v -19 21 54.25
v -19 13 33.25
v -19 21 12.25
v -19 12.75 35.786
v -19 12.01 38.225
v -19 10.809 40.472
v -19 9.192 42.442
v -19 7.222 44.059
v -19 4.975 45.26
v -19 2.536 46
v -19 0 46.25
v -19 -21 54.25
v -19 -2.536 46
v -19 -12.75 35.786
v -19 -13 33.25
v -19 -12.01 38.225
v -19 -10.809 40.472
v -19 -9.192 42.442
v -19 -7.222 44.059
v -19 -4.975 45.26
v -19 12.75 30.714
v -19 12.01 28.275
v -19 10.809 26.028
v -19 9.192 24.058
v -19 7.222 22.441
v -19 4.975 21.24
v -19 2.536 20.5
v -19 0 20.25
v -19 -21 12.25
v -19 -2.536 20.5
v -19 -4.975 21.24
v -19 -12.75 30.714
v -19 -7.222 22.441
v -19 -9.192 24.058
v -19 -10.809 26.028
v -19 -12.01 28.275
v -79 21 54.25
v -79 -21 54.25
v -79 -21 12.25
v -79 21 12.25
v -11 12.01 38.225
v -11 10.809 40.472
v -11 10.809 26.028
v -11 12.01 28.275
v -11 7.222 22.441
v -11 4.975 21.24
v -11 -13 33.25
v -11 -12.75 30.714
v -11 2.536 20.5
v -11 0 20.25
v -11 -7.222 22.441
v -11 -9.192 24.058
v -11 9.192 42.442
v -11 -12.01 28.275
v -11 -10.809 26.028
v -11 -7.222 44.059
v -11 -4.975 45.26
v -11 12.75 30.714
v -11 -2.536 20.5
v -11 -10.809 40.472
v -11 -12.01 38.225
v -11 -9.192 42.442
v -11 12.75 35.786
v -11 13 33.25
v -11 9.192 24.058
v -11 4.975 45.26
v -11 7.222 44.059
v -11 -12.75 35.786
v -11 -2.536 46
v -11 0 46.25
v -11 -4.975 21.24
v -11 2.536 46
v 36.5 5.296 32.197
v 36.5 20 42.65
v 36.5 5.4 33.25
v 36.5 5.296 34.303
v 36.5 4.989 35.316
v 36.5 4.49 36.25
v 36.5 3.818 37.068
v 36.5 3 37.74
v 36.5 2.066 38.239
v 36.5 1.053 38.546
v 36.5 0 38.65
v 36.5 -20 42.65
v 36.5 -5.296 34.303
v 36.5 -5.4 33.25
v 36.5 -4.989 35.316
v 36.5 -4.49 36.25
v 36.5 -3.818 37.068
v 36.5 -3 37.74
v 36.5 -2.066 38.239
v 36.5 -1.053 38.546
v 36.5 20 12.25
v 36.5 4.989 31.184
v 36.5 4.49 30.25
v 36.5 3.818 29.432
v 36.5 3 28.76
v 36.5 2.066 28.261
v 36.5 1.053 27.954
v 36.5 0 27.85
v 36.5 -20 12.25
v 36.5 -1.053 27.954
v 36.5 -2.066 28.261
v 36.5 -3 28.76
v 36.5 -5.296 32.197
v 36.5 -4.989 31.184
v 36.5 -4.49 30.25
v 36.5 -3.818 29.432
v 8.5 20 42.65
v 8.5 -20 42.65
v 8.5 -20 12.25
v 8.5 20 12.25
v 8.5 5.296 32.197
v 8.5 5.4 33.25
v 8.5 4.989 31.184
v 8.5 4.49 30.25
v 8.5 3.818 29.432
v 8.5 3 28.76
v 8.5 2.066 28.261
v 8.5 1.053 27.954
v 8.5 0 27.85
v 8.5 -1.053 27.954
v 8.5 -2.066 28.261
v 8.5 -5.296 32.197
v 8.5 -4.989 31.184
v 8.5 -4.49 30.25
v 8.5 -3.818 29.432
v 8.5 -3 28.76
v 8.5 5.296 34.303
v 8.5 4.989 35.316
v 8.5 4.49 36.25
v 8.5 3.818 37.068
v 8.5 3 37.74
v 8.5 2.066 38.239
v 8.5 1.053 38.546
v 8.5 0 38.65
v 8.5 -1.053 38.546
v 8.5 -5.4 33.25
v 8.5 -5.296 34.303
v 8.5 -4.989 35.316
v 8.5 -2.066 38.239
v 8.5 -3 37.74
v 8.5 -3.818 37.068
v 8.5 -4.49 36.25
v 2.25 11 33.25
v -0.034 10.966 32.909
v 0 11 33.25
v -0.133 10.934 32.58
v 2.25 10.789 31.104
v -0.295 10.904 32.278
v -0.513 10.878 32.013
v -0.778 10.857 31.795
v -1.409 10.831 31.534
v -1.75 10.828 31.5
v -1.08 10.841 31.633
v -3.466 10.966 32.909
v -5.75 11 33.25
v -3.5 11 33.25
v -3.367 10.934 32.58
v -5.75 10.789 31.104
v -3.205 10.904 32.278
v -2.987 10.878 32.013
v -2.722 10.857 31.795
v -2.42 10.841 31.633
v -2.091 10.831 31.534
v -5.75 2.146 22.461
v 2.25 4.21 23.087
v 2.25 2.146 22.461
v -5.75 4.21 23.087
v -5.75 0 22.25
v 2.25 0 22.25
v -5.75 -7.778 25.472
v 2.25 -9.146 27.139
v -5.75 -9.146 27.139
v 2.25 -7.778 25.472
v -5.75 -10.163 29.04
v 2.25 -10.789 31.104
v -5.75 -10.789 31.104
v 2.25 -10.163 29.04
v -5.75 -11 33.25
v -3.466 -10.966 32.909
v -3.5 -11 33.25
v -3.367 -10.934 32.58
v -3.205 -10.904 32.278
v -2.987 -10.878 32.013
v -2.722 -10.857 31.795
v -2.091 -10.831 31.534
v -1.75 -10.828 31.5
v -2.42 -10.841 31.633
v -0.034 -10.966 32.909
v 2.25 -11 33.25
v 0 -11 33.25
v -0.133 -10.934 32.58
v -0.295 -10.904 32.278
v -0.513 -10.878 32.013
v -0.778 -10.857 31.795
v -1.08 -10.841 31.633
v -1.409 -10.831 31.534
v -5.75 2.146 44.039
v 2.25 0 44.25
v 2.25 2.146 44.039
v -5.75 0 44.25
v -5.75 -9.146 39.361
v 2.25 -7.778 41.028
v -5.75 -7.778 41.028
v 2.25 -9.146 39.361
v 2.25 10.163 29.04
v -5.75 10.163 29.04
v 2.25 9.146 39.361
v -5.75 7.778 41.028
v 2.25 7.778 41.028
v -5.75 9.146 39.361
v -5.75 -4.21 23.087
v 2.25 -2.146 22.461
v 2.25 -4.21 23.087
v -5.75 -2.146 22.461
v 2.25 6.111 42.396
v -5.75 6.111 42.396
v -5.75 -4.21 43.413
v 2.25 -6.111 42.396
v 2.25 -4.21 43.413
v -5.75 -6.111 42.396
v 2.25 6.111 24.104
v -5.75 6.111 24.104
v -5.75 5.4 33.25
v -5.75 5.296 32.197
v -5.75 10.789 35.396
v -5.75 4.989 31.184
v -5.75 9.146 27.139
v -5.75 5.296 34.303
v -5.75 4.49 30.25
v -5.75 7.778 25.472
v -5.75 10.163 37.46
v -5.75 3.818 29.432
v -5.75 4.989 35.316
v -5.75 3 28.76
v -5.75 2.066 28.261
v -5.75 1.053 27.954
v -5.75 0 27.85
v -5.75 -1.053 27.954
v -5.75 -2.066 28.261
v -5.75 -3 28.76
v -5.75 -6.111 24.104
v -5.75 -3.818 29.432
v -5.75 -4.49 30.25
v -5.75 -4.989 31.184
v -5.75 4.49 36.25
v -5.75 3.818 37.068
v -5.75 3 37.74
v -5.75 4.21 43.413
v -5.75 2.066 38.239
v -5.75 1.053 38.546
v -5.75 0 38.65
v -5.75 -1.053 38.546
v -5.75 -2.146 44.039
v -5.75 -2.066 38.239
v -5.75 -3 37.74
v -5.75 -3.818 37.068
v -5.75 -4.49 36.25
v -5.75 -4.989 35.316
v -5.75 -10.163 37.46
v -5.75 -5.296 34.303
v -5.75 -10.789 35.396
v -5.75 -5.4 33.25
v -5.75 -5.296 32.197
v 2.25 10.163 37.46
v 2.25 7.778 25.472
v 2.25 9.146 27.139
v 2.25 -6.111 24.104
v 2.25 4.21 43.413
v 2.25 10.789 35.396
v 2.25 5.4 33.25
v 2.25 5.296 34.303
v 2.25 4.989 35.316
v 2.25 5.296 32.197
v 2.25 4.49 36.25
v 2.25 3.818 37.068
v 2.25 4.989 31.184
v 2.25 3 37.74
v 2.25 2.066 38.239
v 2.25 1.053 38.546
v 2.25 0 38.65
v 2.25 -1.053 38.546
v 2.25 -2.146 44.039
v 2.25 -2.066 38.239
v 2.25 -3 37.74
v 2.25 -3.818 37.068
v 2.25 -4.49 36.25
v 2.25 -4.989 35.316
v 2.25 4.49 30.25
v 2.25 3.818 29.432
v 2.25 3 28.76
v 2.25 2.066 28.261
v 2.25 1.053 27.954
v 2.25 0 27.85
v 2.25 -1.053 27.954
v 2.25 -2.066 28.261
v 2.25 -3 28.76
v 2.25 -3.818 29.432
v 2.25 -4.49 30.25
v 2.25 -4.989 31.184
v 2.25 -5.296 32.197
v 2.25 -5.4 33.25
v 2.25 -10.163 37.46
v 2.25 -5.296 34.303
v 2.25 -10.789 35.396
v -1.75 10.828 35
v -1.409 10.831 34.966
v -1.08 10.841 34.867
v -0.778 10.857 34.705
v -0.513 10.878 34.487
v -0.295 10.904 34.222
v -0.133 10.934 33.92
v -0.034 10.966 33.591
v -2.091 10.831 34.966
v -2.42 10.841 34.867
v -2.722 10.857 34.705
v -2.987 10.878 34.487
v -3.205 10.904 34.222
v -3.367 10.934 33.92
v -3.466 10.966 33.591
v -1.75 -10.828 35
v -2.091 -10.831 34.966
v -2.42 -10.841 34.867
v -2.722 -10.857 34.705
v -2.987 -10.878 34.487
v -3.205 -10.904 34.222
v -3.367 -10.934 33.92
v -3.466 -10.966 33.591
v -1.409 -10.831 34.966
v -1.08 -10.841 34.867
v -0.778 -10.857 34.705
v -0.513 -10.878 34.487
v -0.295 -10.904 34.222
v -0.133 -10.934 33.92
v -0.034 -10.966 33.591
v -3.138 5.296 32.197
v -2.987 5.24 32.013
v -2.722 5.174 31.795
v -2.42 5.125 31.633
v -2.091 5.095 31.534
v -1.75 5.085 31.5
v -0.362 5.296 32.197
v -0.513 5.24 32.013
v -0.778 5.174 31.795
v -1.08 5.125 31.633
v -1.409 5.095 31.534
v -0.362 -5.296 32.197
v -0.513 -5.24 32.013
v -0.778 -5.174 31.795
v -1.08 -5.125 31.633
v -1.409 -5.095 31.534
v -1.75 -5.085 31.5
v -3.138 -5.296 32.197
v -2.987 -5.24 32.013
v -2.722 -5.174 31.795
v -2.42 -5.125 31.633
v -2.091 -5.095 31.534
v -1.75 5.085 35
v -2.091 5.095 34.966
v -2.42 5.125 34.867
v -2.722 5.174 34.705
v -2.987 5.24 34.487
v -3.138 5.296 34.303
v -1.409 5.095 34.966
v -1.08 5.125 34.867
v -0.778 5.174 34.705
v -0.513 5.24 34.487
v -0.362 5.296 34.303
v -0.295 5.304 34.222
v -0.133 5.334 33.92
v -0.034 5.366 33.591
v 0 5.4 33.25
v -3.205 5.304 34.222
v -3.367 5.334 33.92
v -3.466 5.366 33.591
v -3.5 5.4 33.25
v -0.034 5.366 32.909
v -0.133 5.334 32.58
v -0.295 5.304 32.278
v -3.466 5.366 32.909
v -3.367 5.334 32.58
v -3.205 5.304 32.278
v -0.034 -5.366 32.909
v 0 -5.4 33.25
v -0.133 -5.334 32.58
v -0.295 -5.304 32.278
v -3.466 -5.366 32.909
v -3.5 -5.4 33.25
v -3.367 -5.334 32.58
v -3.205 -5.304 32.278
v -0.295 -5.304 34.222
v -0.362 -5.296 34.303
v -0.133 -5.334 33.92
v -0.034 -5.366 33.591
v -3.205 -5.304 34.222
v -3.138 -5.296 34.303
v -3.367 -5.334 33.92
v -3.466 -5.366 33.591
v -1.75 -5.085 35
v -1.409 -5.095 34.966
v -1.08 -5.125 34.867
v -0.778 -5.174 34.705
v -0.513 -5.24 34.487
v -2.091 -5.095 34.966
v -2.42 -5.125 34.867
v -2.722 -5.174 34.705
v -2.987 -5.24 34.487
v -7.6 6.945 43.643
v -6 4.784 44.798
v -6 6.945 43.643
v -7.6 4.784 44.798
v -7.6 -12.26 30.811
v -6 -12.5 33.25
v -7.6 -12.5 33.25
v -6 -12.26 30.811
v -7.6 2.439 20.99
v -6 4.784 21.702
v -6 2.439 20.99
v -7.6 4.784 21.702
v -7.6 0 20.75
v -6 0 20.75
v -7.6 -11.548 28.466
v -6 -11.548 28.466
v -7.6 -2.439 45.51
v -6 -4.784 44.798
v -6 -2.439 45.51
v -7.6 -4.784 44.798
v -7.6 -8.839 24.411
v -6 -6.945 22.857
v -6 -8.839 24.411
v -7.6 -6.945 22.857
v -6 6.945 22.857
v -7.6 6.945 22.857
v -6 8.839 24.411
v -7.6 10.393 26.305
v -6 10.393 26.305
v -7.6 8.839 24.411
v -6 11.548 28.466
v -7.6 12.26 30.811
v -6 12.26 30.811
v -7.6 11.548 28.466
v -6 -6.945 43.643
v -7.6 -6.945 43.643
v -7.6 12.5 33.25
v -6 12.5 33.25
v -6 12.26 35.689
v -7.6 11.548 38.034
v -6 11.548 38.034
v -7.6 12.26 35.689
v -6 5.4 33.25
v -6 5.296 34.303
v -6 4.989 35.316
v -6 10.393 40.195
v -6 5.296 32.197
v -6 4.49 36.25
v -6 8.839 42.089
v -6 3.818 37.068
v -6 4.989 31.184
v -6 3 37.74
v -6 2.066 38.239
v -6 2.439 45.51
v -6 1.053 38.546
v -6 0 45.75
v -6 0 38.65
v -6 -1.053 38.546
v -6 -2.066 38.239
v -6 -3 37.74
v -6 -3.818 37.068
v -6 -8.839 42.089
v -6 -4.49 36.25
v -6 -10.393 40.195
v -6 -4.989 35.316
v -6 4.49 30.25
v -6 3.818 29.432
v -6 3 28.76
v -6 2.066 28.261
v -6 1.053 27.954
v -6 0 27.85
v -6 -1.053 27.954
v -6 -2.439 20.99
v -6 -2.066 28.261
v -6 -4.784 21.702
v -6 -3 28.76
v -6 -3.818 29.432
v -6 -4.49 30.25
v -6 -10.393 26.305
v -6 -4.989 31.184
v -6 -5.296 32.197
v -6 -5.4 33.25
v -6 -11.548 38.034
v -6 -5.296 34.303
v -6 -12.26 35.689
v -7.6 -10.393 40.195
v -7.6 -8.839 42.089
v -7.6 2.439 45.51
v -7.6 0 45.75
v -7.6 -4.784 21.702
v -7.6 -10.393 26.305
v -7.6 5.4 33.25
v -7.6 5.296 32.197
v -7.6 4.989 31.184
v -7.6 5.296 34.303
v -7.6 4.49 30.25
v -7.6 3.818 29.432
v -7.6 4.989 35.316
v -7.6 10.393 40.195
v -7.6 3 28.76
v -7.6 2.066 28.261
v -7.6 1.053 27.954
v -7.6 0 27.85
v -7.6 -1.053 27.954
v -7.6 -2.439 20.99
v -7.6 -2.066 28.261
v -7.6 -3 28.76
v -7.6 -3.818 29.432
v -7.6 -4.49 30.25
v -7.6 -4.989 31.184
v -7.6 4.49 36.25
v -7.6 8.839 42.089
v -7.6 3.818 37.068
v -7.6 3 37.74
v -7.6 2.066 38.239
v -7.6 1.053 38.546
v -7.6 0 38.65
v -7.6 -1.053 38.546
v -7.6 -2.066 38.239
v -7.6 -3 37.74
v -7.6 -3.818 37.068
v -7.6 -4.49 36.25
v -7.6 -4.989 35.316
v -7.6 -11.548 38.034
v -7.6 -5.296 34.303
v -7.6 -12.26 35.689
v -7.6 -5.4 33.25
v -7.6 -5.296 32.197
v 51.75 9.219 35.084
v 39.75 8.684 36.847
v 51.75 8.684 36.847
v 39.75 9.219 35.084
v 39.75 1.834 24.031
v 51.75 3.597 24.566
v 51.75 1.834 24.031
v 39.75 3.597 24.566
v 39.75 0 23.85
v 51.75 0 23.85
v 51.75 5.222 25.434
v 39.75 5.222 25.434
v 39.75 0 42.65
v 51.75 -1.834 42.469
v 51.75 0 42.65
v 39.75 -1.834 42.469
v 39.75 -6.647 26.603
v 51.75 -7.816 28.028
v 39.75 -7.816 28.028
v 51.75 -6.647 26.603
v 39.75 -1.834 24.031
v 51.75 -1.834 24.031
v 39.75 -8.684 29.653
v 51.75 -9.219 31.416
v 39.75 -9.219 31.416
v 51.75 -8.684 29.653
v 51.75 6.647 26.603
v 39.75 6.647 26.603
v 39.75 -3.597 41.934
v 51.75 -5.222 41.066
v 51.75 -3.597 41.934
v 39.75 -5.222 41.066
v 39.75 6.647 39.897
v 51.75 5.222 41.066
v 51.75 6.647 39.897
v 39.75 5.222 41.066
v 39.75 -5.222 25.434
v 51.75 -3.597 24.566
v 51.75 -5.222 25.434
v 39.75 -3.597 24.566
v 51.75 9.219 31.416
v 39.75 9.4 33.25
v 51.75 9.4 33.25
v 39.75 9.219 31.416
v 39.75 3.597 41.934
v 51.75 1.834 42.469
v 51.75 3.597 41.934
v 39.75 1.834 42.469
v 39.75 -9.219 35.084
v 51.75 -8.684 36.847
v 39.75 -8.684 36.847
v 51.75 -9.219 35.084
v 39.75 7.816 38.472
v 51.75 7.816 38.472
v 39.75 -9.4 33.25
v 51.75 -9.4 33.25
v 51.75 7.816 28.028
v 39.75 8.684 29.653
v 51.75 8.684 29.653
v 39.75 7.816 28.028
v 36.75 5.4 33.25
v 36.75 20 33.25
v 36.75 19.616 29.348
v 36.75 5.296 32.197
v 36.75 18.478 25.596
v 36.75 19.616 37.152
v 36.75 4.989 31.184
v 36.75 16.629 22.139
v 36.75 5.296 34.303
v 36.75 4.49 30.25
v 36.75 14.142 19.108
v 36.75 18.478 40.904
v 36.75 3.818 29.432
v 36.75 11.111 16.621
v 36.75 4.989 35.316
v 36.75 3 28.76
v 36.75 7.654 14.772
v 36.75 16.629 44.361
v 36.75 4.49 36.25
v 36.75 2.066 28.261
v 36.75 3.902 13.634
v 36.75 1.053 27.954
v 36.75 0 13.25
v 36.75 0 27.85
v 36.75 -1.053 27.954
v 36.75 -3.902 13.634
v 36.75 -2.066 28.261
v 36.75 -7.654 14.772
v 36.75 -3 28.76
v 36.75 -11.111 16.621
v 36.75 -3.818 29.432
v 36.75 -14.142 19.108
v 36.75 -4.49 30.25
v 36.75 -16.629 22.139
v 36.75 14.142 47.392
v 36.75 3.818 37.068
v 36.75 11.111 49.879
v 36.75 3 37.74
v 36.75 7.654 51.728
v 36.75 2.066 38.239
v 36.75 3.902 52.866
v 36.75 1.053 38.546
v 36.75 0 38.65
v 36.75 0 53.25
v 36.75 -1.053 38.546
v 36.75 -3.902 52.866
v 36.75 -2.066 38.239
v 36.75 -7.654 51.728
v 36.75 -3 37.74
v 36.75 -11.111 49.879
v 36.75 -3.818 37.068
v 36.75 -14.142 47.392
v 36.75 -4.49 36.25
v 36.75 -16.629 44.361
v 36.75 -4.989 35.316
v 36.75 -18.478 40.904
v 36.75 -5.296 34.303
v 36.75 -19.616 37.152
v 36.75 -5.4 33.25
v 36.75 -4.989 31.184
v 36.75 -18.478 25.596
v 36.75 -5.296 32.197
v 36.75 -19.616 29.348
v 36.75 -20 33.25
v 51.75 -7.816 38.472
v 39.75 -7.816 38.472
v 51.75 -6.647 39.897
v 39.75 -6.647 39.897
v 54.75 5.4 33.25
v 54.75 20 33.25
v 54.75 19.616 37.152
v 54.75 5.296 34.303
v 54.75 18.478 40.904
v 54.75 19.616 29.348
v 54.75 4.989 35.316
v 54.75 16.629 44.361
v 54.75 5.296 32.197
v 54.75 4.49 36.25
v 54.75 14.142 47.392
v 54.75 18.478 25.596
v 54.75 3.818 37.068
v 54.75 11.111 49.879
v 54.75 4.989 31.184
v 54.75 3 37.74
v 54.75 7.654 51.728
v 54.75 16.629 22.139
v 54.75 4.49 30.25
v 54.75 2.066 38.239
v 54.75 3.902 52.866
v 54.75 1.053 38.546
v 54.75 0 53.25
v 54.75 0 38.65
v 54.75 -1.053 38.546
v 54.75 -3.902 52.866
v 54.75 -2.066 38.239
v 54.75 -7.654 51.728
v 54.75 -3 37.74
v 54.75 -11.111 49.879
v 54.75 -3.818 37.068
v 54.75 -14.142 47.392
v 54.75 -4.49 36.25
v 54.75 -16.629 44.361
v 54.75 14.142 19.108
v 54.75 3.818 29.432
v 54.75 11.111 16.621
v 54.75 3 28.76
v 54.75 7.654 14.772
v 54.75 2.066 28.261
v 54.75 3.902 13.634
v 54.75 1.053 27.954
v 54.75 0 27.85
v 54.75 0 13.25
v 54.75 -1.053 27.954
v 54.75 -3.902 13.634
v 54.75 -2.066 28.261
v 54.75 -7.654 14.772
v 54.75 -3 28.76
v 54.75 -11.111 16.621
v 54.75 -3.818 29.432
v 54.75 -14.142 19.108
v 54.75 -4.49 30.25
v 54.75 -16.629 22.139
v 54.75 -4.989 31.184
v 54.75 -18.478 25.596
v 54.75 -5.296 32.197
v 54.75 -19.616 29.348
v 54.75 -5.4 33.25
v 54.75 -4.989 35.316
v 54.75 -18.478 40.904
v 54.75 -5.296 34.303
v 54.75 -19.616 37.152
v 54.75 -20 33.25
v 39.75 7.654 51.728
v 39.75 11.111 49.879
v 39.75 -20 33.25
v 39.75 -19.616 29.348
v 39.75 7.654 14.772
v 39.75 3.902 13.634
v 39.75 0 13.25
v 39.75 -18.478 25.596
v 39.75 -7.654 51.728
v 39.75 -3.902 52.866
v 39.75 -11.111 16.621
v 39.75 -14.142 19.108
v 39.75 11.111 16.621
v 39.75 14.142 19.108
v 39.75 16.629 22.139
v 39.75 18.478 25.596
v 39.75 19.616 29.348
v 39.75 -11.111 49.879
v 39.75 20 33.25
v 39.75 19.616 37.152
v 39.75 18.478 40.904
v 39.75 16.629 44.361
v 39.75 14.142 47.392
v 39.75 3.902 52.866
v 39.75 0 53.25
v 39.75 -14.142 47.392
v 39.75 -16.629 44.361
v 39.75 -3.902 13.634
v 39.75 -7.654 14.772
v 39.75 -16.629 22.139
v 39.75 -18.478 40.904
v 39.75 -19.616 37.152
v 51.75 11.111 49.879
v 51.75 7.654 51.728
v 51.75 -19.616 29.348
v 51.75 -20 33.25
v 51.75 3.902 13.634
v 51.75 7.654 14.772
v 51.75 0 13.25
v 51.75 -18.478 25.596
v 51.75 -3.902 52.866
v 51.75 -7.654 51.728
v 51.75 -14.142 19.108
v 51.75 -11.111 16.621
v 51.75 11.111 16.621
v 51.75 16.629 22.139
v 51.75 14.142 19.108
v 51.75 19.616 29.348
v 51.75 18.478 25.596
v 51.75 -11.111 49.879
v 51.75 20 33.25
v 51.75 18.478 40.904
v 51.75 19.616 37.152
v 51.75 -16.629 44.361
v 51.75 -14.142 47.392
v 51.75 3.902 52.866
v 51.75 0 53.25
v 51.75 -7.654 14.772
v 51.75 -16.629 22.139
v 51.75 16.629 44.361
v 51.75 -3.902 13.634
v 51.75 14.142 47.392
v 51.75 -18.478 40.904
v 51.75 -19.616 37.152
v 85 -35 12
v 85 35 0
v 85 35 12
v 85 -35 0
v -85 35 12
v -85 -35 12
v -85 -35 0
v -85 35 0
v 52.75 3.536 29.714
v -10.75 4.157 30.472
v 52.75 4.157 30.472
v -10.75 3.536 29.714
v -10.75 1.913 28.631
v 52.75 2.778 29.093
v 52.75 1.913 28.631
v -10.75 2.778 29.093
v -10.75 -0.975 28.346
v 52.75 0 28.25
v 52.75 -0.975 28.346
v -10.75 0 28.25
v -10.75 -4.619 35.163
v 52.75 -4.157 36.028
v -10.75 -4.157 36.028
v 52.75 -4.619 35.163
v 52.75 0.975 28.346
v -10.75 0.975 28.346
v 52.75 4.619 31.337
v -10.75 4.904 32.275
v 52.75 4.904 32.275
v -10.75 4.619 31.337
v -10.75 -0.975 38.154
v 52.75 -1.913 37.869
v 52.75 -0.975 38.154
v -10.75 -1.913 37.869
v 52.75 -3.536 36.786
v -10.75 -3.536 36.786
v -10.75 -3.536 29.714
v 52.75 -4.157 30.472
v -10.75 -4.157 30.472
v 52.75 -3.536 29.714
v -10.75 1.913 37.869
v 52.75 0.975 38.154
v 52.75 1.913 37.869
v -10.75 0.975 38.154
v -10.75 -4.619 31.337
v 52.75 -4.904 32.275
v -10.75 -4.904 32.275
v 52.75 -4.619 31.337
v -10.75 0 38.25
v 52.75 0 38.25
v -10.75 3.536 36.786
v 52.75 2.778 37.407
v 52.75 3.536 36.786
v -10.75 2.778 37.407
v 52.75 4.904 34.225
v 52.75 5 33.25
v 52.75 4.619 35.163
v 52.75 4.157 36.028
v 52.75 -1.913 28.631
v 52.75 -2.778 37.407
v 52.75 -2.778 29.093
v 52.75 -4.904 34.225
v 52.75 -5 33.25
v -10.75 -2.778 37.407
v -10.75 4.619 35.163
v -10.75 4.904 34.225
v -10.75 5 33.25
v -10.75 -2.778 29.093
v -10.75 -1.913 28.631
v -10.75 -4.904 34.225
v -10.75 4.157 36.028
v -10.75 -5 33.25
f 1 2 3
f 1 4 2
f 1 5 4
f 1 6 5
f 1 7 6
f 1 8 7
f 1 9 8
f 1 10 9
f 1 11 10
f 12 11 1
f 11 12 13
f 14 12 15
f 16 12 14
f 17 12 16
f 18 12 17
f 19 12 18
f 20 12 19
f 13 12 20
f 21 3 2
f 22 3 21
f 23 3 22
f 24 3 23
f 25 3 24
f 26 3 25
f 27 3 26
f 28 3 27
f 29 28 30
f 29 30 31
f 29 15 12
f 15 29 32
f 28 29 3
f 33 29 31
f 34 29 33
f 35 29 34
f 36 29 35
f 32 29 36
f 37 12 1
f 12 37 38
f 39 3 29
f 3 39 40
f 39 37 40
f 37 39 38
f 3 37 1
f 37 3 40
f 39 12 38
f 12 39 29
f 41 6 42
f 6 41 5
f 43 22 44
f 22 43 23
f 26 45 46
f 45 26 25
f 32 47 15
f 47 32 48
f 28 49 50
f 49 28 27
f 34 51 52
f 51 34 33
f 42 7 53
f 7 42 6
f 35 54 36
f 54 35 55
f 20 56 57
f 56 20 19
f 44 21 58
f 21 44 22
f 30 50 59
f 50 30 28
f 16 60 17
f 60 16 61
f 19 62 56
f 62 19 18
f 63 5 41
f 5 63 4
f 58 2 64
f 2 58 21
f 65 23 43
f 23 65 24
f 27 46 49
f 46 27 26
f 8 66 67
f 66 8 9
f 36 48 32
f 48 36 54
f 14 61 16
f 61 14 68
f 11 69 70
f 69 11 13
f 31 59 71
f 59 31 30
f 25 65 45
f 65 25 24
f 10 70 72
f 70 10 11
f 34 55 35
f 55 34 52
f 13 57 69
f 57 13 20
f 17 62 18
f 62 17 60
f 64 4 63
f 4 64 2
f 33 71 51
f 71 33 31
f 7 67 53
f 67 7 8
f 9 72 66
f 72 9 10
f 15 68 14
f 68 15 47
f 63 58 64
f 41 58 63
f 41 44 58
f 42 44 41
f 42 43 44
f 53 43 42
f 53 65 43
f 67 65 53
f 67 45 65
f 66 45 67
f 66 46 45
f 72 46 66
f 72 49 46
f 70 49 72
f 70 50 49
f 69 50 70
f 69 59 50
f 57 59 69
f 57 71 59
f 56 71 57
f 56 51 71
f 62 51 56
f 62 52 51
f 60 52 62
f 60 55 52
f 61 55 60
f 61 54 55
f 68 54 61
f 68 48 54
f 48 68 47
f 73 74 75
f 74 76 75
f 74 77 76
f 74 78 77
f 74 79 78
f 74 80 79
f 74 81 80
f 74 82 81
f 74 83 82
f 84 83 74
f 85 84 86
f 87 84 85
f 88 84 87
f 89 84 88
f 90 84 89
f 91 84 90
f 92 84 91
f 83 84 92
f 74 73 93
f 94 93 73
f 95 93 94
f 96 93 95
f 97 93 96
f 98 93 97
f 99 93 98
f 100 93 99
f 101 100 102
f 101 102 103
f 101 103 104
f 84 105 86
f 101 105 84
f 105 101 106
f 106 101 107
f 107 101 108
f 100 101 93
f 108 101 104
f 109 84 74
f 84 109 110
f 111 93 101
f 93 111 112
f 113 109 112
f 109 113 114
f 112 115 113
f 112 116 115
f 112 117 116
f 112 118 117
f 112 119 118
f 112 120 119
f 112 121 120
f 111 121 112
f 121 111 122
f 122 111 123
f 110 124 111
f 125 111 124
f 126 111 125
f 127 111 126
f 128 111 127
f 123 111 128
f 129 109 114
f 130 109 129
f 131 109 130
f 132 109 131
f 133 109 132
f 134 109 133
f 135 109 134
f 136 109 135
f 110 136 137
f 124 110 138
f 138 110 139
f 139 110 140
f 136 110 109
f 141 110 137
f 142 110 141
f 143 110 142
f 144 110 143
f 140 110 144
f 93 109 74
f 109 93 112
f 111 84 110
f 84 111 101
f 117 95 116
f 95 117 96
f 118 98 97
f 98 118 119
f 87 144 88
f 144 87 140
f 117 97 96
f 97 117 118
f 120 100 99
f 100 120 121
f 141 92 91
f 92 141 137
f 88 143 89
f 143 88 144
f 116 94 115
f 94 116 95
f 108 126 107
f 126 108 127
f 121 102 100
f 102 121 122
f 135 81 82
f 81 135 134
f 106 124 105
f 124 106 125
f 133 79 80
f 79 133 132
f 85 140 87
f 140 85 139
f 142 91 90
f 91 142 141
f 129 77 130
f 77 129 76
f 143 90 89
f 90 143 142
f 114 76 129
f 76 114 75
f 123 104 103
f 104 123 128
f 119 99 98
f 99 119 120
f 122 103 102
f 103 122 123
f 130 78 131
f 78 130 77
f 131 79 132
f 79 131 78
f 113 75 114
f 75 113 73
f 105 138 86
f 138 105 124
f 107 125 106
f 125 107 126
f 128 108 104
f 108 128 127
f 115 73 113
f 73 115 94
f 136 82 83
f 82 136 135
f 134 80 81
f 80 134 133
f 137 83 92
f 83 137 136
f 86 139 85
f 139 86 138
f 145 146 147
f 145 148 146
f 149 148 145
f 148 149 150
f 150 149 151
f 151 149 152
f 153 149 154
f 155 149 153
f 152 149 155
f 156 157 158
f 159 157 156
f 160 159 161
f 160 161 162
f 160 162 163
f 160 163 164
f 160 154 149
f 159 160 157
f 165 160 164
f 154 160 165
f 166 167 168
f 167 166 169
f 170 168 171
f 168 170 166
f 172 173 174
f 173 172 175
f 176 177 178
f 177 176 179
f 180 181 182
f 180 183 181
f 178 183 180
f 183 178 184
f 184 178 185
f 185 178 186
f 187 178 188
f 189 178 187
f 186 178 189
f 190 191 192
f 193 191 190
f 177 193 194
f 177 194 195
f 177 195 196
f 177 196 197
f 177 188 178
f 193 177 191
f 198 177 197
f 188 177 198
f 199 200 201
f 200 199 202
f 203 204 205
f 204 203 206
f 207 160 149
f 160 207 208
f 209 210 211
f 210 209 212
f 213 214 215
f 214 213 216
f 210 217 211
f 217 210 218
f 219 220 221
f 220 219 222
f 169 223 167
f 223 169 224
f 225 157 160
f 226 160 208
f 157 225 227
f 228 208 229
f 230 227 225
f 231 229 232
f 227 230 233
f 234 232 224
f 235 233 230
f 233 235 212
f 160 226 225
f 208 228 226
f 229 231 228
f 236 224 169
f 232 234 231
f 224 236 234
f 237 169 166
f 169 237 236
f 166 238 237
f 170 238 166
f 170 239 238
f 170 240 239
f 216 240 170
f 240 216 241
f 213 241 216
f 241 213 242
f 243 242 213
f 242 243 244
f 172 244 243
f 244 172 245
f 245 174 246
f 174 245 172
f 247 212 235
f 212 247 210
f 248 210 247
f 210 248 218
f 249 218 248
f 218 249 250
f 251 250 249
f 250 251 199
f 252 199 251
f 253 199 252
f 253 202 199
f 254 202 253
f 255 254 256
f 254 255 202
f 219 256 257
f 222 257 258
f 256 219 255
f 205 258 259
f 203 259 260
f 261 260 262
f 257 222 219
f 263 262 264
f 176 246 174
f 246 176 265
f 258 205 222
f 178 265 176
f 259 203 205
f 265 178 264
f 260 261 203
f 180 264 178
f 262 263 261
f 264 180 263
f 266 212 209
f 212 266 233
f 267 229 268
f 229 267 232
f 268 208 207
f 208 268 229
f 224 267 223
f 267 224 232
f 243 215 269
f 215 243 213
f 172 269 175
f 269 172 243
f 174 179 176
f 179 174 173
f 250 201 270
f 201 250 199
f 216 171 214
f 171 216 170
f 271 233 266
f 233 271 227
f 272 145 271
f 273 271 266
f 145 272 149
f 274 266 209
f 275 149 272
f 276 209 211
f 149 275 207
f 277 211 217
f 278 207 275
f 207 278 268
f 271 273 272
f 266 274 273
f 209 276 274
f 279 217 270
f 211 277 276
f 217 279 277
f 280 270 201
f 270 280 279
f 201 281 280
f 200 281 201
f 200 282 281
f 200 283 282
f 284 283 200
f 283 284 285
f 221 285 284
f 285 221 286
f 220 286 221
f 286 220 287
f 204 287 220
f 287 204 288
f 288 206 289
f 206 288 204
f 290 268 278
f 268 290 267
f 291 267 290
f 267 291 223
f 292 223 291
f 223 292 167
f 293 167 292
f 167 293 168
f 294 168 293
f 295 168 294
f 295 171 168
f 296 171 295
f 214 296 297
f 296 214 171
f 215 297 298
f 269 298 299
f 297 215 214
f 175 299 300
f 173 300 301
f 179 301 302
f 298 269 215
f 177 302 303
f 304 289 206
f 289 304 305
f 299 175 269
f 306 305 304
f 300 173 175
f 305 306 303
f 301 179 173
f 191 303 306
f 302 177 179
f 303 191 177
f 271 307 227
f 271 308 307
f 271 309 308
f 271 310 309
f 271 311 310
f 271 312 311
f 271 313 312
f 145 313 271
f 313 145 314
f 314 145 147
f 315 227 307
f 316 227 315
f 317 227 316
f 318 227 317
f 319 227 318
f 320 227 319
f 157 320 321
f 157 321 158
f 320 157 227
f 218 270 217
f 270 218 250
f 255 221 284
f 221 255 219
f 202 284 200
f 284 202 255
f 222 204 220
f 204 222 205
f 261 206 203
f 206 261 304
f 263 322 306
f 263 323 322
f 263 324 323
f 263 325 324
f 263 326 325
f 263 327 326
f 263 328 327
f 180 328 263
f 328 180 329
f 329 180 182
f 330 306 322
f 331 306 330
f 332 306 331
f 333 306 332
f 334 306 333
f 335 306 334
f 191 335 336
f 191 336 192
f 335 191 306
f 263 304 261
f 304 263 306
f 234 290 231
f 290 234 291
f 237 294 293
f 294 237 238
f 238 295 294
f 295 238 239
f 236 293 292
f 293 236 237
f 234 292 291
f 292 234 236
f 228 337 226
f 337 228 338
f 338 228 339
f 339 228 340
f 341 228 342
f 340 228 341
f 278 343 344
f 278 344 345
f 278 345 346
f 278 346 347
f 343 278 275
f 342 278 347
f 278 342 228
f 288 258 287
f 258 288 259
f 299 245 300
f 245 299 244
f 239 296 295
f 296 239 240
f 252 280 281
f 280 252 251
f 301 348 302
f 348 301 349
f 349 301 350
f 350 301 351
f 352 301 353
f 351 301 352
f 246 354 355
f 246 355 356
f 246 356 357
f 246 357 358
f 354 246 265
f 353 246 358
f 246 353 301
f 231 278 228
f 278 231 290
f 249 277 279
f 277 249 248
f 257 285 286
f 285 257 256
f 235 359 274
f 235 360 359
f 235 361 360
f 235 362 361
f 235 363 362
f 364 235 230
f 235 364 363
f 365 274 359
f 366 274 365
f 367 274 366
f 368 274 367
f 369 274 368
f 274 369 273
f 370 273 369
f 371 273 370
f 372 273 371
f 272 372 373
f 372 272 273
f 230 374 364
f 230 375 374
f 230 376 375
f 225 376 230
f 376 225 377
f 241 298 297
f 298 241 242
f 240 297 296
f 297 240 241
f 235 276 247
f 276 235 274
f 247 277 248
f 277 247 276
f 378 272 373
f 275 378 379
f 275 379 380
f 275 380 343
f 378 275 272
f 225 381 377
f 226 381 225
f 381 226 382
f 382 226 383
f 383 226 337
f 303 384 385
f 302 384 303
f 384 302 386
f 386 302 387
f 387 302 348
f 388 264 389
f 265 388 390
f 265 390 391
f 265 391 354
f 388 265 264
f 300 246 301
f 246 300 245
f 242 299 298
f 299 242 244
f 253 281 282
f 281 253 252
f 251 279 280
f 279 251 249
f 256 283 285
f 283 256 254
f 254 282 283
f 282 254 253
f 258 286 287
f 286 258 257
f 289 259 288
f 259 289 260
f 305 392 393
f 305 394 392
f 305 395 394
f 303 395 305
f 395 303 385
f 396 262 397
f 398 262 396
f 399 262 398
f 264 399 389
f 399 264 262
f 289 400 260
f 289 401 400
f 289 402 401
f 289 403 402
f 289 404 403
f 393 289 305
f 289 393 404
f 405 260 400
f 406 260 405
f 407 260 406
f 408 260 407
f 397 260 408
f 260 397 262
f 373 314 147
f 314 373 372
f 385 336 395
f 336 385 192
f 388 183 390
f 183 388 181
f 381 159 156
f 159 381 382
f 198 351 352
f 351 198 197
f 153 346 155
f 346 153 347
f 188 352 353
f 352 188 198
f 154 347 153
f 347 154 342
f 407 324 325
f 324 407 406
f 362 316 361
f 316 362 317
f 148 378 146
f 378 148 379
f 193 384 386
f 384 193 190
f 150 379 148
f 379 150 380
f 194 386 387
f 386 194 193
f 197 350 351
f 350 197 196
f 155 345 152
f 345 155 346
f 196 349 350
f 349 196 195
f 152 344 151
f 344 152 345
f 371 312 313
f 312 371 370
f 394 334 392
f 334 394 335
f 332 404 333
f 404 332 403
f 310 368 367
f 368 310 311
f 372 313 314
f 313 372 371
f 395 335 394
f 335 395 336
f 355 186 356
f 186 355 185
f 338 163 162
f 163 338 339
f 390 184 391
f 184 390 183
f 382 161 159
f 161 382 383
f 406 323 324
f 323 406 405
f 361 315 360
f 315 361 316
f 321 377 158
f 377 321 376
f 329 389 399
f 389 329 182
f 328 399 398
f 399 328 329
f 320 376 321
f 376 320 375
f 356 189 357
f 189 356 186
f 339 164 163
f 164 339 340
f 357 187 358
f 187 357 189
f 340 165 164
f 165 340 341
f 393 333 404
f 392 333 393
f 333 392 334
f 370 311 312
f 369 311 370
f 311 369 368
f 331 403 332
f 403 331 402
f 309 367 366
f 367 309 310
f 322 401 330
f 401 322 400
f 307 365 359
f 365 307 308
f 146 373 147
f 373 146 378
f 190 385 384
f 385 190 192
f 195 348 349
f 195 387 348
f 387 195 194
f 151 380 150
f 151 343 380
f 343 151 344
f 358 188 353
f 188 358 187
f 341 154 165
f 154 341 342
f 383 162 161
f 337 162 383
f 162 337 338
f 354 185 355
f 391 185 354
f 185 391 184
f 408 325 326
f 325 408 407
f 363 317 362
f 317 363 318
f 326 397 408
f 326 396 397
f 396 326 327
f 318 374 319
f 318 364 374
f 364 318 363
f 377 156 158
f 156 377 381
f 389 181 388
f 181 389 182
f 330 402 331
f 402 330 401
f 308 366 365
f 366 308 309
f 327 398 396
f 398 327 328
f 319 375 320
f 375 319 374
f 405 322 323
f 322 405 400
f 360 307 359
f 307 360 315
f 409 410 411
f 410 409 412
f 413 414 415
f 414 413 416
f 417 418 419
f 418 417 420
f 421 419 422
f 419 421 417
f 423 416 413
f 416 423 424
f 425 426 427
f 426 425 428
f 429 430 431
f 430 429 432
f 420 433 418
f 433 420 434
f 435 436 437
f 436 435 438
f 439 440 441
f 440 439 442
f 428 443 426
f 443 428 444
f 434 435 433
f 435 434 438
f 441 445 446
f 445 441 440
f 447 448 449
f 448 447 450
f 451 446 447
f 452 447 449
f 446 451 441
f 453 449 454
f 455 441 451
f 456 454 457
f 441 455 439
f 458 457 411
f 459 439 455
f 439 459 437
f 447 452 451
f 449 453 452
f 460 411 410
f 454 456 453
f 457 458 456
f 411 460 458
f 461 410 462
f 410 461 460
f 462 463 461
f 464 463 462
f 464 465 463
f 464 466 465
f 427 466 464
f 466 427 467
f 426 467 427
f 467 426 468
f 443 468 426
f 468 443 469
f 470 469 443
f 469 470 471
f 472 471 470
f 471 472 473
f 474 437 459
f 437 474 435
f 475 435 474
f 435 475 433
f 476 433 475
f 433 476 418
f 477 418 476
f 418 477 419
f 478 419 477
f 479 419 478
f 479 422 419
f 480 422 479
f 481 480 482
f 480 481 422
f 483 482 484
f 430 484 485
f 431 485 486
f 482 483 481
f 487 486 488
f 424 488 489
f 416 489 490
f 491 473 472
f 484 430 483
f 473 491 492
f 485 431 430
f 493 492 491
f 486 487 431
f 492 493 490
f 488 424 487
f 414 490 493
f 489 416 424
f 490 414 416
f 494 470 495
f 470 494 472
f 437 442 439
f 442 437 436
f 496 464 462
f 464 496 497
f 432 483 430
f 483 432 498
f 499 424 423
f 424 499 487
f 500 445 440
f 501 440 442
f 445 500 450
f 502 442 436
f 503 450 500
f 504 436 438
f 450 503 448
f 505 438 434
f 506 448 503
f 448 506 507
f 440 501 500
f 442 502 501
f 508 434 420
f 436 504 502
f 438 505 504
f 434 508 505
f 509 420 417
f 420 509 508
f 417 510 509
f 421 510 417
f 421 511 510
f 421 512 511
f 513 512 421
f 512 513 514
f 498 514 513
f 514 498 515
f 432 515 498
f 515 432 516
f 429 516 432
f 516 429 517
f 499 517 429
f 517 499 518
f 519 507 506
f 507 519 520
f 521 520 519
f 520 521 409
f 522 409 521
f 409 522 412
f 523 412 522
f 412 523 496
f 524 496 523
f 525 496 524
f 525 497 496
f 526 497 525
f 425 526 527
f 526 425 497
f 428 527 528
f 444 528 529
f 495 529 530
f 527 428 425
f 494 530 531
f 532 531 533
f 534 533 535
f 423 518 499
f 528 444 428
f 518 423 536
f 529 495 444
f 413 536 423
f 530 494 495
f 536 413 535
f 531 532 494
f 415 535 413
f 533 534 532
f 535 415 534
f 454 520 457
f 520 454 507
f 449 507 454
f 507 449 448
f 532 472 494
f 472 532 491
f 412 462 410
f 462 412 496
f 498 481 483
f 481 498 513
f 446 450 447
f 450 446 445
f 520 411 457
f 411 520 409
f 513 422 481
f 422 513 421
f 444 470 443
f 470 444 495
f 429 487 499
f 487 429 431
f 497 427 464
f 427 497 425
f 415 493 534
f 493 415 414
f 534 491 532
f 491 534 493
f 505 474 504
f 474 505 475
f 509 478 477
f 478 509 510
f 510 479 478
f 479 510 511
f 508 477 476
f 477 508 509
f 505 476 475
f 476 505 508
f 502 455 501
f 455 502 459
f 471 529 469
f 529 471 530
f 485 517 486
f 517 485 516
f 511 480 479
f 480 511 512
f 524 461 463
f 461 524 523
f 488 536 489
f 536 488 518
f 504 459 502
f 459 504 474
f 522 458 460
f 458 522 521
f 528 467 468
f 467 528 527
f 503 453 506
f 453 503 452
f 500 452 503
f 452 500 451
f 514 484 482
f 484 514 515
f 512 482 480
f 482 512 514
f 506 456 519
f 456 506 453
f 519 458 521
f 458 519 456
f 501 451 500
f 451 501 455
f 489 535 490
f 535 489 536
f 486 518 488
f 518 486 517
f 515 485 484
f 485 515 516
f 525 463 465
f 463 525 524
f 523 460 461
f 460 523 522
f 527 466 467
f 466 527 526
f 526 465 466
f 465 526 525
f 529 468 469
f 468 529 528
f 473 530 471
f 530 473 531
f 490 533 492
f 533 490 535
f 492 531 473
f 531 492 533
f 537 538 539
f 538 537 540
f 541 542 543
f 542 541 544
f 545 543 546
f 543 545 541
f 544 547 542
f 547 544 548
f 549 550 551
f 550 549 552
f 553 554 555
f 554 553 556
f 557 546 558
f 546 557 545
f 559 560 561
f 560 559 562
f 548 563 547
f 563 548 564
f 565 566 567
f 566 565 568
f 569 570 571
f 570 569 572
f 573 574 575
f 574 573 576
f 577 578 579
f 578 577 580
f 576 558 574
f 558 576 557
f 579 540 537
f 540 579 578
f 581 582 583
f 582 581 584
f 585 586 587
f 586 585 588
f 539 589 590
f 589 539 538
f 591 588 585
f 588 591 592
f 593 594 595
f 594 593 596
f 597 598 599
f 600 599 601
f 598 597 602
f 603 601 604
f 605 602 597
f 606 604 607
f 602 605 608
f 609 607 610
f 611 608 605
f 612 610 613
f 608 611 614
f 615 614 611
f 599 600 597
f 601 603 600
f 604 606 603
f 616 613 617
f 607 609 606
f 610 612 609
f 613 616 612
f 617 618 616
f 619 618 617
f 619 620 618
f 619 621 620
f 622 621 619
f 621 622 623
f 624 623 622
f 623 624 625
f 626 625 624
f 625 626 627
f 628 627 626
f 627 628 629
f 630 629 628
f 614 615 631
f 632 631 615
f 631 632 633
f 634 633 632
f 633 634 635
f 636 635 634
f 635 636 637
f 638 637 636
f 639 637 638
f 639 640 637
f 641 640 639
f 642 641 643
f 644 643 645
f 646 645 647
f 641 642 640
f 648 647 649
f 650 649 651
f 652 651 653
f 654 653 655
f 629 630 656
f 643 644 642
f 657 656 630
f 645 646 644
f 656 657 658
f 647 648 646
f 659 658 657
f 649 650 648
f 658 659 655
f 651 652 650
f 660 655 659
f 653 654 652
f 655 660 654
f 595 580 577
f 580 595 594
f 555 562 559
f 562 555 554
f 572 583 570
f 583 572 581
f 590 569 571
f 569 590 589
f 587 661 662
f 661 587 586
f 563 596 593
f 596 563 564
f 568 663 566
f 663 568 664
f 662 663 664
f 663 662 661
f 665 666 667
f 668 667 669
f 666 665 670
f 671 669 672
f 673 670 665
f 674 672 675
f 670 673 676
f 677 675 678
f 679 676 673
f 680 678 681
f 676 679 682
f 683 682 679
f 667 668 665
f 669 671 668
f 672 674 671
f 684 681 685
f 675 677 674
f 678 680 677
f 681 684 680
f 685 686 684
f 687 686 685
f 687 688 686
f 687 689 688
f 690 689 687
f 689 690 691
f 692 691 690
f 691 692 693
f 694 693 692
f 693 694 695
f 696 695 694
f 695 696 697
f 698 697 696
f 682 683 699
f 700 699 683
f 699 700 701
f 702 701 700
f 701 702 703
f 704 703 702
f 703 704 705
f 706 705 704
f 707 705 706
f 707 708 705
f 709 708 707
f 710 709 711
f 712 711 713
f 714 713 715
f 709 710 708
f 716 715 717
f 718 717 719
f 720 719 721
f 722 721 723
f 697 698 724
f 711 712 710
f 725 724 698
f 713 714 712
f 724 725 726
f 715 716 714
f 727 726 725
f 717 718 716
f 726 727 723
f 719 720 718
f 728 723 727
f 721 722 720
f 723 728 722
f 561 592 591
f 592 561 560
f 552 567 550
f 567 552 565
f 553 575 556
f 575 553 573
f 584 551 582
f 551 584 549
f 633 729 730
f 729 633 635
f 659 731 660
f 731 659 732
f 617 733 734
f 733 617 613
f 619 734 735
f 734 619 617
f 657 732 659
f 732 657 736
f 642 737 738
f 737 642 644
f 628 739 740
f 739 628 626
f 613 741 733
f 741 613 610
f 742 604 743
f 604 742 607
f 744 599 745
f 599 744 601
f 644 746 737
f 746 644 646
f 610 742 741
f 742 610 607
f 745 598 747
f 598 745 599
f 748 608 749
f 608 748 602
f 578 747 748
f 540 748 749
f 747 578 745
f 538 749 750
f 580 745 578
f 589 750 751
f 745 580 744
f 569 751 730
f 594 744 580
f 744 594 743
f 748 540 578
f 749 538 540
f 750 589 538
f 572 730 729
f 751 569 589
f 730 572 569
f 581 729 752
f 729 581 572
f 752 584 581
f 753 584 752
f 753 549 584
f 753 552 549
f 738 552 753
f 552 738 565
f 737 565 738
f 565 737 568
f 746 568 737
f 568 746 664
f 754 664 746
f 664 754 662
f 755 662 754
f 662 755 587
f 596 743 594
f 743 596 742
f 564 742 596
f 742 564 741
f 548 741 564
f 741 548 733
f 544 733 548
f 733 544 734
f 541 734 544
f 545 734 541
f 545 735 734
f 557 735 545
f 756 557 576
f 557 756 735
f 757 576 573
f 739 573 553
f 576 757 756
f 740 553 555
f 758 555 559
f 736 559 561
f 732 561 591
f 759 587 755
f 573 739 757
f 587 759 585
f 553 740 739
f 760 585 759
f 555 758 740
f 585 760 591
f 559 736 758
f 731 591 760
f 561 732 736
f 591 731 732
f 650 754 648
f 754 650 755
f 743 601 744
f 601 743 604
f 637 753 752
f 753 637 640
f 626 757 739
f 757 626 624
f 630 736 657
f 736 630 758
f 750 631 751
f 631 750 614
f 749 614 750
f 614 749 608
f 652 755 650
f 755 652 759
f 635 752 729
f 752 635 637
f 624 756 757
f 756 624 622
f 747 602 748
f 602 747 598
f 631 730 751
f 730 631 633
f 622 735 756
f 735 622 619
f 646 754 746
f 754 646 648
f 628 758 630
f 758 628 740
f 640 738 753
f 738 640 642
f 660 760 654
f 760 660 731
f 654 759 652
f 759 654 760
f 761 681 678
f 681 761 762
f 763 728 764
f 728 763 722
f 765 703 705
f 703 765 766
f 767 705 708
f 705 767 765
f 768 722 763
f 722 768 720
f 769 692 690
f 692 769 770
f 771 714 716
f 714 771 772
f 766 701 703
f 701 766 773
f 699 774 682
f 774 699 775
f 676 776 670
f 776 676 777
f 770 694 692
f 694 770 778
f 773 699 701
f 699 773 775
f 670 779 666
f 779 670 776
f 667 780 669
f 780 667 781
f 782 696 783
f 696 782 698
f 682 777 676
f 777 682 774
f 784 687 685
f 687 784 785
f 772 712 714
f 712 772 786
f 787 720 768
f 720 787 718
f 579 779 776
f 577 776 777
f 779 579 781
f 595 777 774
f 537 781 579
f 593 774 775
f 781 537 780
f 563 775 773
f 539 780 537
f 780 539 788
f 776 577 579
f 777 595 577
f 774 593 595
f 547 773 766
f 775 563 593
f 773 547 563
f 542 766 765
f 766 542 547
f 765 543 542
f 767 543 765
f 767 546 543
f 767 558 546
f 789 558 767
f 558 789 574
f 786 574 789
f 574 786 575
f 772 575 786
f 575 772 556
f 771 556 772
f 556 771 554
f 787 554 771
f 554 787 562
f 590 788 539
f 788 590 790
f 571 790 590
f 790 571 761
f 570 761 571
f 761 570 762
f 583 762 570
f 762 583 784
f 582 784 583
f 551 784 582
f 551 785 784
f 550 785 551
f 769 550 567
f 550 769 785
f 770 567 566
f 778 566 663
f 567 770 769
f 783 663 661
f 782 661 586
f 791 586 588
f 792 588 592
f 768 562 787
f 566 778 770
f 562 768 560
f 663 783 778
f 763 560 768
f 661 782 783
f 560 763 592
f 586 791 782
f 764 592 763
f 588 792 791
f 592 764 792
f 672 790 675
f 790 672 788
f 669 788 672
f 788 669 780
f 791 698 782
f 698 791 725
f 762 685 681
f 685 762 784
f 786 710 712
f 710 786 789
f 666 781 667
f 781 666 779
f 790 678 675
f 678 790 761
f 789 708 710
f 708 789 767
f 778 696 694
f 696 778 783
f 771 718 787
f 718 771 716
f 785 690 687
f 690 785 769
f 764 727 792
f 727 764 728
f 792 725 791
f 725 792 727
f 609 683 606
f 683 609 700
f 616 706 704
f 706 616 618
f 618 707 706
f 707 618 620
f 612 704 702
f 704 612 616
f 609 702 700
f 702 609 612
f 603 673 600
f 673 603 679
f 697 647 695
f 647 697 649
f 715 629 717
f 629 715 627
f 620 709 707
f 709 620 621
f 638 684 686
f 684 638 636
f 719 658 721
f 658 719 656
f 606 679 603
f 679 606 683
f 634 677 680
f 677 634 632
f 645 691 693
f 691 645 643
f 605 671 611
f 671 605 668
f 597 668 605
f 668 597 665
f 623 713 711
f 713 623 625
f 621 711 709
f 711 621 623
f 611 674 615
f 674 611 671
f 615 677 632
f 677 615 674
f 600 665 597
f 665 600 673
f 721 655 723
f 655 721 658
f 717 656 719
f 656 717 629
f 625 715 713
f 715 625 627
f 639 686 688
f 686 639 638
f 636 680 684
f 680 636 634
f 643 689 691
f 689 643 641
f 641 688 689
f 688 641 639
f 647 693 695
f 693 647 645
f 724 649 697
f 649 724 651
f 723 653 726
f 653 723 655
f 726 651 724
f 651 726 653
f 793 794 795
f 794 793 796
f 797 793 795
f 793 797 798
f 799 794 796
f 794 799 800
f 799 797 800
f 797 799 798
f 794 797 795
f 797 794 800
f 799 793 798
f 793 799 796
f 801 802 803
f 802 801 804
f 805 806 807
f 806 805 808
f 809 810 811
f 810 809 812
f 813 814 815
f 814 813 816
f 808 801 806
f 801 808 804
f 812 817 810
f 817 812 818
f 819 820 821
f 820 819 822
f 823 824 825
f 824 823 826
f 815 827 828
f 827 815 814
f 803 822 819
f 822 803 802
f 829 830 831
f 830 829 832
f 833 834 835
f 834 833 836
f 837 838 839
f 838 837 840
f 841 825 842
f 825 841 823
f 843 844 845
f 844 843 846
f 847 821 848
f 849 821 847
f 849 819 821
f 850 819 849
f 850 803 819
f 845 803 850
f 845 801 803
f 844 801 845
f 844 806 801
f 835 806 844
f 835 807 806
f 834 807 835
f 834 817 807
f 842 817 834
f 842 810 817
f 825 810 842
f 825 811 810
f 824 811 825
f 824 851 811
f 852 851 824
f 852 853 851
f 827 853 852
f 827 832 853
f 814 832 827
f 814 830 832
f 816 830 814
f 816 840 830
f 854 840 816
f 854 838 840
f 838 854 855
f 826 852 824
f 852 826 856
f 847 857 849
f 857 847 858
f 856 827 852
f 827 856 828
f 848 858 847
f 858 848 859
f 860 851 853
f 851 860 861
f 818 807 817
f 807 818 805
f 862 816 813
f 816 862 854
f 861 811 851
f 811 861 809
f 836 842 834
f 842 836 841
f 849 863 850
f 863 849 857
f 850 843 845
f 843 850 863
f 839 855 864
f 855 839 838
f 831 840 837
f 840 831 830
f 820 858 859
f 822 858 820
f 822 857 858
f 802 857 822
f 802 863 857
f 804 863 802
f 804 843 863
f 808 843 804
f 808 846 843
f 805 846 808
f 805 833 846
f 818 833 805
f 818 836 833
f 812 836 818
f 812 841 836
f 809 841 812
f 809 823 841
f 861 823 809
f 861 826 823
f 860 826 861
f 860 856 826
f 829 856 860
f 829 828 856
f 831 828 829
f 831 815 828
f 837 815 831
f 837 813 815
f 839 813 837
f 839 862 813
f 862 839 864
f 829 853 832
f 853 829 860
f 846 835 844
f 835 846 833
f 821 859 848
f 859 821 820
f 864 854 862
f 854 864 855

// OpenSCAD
$fn = 32;

// ------------------------------------------------------------------------
// Motor drive station: motor 60 x 42 mm, shaft d10, pulley d40
// Every part is its own module, assembly() places every instance.
// ------------------------------------------------------------------------

// --- part 1 ---
module station_bed() {
  difference() {
    translate([-85, -35, 0]) cube([170, 70, 12]);
  }
}

// --- part 2 ---
module drive_motor() {
  union() {
    translate([-30, -21, 0]) cube([60, 42, 42]);
    translate([34, 0, 21]) rotate([0, 90, 0]) cylinder(h = 8, d = 26, center = true);
  }
}

// --- part 3 ---
module pillow_block() {
  difference() {
    translate([-14, -20, 0]) cube([28, 40, 30.4]);
    translate([0, 0, 21]) rotate([0, 90, 0]) cylinder(h = 30, d = 10.8, center = true);
  }
}

// --- part 4 ---
module drive_shaft() {
  translate([0, 0, -31.75]) cylinder(h = 63.5, d = 10);
}

// --- part 5 ---
module shaft_collar() {
  difference() {
    cylinder(h = 8, d = 22);
    translate([0, 0, -1]) cylinder(h = 10, d = 10.8);
    translate([0, 0, 4]) rotate([90, 0, 0]) cylinder(h = 24, d = 3.5, center = true);
  }
}

// --- part 6 ---
module collar_washer() {
  difference() {
      translate([0, 0, 0]) cylinder(h = 1.6, d = 25);
      translate([0, 0, -1]) cylinder(h = 3.6, d = 10.8);
    }
}

// --- part 7 ---
module drive_pulley() {
  difference() {
    union() {
      cylinder(h = 18, d = 18.8);
      cylinder(h = 3, d = 40);
      translate([0, 0, 15]) cylinder(h = 3, d = 40);
    }
    translate([0, 0, -1]) cylinder(h = 20, d = 10.8);
  }
}

// --- assembly ---
module assembly() {
  color([0.80, 0.24, 0.20]) translate([0, 0, 0]) rotate([0, 0, 0]) station_bed();
  color([0.20, 0.45, 0.75]) translate([-49, 0, 12.25]) rotate([0, 0, 0]) drive_motor();
  color([0.25, 0.62, 0.32]) translate([22.5, 0, 12.25]) rotate([0, 0, 0]) pillow_block();
  color([0.92, 0.70, 0.18]) translate([21, 0, 33.25]) rotate([0, 90, 0]) drive_shaft();
  color([0.58, 0.35, 0.70]) translate([-5.75, 0, 33.25]) rotate([0, 90, 0]) shaft_collar();
  color([0.16, 0.66, 0.66]) translate([-7.6, 0, 33.25]) rotate([0, 90, 0]) collar_washer();
  color([0.85, 0.48, 0.18]) translate([36.75, 0, 33.25]) rotate([0, 90, 0]) drive_pulley();
}

assembly();
